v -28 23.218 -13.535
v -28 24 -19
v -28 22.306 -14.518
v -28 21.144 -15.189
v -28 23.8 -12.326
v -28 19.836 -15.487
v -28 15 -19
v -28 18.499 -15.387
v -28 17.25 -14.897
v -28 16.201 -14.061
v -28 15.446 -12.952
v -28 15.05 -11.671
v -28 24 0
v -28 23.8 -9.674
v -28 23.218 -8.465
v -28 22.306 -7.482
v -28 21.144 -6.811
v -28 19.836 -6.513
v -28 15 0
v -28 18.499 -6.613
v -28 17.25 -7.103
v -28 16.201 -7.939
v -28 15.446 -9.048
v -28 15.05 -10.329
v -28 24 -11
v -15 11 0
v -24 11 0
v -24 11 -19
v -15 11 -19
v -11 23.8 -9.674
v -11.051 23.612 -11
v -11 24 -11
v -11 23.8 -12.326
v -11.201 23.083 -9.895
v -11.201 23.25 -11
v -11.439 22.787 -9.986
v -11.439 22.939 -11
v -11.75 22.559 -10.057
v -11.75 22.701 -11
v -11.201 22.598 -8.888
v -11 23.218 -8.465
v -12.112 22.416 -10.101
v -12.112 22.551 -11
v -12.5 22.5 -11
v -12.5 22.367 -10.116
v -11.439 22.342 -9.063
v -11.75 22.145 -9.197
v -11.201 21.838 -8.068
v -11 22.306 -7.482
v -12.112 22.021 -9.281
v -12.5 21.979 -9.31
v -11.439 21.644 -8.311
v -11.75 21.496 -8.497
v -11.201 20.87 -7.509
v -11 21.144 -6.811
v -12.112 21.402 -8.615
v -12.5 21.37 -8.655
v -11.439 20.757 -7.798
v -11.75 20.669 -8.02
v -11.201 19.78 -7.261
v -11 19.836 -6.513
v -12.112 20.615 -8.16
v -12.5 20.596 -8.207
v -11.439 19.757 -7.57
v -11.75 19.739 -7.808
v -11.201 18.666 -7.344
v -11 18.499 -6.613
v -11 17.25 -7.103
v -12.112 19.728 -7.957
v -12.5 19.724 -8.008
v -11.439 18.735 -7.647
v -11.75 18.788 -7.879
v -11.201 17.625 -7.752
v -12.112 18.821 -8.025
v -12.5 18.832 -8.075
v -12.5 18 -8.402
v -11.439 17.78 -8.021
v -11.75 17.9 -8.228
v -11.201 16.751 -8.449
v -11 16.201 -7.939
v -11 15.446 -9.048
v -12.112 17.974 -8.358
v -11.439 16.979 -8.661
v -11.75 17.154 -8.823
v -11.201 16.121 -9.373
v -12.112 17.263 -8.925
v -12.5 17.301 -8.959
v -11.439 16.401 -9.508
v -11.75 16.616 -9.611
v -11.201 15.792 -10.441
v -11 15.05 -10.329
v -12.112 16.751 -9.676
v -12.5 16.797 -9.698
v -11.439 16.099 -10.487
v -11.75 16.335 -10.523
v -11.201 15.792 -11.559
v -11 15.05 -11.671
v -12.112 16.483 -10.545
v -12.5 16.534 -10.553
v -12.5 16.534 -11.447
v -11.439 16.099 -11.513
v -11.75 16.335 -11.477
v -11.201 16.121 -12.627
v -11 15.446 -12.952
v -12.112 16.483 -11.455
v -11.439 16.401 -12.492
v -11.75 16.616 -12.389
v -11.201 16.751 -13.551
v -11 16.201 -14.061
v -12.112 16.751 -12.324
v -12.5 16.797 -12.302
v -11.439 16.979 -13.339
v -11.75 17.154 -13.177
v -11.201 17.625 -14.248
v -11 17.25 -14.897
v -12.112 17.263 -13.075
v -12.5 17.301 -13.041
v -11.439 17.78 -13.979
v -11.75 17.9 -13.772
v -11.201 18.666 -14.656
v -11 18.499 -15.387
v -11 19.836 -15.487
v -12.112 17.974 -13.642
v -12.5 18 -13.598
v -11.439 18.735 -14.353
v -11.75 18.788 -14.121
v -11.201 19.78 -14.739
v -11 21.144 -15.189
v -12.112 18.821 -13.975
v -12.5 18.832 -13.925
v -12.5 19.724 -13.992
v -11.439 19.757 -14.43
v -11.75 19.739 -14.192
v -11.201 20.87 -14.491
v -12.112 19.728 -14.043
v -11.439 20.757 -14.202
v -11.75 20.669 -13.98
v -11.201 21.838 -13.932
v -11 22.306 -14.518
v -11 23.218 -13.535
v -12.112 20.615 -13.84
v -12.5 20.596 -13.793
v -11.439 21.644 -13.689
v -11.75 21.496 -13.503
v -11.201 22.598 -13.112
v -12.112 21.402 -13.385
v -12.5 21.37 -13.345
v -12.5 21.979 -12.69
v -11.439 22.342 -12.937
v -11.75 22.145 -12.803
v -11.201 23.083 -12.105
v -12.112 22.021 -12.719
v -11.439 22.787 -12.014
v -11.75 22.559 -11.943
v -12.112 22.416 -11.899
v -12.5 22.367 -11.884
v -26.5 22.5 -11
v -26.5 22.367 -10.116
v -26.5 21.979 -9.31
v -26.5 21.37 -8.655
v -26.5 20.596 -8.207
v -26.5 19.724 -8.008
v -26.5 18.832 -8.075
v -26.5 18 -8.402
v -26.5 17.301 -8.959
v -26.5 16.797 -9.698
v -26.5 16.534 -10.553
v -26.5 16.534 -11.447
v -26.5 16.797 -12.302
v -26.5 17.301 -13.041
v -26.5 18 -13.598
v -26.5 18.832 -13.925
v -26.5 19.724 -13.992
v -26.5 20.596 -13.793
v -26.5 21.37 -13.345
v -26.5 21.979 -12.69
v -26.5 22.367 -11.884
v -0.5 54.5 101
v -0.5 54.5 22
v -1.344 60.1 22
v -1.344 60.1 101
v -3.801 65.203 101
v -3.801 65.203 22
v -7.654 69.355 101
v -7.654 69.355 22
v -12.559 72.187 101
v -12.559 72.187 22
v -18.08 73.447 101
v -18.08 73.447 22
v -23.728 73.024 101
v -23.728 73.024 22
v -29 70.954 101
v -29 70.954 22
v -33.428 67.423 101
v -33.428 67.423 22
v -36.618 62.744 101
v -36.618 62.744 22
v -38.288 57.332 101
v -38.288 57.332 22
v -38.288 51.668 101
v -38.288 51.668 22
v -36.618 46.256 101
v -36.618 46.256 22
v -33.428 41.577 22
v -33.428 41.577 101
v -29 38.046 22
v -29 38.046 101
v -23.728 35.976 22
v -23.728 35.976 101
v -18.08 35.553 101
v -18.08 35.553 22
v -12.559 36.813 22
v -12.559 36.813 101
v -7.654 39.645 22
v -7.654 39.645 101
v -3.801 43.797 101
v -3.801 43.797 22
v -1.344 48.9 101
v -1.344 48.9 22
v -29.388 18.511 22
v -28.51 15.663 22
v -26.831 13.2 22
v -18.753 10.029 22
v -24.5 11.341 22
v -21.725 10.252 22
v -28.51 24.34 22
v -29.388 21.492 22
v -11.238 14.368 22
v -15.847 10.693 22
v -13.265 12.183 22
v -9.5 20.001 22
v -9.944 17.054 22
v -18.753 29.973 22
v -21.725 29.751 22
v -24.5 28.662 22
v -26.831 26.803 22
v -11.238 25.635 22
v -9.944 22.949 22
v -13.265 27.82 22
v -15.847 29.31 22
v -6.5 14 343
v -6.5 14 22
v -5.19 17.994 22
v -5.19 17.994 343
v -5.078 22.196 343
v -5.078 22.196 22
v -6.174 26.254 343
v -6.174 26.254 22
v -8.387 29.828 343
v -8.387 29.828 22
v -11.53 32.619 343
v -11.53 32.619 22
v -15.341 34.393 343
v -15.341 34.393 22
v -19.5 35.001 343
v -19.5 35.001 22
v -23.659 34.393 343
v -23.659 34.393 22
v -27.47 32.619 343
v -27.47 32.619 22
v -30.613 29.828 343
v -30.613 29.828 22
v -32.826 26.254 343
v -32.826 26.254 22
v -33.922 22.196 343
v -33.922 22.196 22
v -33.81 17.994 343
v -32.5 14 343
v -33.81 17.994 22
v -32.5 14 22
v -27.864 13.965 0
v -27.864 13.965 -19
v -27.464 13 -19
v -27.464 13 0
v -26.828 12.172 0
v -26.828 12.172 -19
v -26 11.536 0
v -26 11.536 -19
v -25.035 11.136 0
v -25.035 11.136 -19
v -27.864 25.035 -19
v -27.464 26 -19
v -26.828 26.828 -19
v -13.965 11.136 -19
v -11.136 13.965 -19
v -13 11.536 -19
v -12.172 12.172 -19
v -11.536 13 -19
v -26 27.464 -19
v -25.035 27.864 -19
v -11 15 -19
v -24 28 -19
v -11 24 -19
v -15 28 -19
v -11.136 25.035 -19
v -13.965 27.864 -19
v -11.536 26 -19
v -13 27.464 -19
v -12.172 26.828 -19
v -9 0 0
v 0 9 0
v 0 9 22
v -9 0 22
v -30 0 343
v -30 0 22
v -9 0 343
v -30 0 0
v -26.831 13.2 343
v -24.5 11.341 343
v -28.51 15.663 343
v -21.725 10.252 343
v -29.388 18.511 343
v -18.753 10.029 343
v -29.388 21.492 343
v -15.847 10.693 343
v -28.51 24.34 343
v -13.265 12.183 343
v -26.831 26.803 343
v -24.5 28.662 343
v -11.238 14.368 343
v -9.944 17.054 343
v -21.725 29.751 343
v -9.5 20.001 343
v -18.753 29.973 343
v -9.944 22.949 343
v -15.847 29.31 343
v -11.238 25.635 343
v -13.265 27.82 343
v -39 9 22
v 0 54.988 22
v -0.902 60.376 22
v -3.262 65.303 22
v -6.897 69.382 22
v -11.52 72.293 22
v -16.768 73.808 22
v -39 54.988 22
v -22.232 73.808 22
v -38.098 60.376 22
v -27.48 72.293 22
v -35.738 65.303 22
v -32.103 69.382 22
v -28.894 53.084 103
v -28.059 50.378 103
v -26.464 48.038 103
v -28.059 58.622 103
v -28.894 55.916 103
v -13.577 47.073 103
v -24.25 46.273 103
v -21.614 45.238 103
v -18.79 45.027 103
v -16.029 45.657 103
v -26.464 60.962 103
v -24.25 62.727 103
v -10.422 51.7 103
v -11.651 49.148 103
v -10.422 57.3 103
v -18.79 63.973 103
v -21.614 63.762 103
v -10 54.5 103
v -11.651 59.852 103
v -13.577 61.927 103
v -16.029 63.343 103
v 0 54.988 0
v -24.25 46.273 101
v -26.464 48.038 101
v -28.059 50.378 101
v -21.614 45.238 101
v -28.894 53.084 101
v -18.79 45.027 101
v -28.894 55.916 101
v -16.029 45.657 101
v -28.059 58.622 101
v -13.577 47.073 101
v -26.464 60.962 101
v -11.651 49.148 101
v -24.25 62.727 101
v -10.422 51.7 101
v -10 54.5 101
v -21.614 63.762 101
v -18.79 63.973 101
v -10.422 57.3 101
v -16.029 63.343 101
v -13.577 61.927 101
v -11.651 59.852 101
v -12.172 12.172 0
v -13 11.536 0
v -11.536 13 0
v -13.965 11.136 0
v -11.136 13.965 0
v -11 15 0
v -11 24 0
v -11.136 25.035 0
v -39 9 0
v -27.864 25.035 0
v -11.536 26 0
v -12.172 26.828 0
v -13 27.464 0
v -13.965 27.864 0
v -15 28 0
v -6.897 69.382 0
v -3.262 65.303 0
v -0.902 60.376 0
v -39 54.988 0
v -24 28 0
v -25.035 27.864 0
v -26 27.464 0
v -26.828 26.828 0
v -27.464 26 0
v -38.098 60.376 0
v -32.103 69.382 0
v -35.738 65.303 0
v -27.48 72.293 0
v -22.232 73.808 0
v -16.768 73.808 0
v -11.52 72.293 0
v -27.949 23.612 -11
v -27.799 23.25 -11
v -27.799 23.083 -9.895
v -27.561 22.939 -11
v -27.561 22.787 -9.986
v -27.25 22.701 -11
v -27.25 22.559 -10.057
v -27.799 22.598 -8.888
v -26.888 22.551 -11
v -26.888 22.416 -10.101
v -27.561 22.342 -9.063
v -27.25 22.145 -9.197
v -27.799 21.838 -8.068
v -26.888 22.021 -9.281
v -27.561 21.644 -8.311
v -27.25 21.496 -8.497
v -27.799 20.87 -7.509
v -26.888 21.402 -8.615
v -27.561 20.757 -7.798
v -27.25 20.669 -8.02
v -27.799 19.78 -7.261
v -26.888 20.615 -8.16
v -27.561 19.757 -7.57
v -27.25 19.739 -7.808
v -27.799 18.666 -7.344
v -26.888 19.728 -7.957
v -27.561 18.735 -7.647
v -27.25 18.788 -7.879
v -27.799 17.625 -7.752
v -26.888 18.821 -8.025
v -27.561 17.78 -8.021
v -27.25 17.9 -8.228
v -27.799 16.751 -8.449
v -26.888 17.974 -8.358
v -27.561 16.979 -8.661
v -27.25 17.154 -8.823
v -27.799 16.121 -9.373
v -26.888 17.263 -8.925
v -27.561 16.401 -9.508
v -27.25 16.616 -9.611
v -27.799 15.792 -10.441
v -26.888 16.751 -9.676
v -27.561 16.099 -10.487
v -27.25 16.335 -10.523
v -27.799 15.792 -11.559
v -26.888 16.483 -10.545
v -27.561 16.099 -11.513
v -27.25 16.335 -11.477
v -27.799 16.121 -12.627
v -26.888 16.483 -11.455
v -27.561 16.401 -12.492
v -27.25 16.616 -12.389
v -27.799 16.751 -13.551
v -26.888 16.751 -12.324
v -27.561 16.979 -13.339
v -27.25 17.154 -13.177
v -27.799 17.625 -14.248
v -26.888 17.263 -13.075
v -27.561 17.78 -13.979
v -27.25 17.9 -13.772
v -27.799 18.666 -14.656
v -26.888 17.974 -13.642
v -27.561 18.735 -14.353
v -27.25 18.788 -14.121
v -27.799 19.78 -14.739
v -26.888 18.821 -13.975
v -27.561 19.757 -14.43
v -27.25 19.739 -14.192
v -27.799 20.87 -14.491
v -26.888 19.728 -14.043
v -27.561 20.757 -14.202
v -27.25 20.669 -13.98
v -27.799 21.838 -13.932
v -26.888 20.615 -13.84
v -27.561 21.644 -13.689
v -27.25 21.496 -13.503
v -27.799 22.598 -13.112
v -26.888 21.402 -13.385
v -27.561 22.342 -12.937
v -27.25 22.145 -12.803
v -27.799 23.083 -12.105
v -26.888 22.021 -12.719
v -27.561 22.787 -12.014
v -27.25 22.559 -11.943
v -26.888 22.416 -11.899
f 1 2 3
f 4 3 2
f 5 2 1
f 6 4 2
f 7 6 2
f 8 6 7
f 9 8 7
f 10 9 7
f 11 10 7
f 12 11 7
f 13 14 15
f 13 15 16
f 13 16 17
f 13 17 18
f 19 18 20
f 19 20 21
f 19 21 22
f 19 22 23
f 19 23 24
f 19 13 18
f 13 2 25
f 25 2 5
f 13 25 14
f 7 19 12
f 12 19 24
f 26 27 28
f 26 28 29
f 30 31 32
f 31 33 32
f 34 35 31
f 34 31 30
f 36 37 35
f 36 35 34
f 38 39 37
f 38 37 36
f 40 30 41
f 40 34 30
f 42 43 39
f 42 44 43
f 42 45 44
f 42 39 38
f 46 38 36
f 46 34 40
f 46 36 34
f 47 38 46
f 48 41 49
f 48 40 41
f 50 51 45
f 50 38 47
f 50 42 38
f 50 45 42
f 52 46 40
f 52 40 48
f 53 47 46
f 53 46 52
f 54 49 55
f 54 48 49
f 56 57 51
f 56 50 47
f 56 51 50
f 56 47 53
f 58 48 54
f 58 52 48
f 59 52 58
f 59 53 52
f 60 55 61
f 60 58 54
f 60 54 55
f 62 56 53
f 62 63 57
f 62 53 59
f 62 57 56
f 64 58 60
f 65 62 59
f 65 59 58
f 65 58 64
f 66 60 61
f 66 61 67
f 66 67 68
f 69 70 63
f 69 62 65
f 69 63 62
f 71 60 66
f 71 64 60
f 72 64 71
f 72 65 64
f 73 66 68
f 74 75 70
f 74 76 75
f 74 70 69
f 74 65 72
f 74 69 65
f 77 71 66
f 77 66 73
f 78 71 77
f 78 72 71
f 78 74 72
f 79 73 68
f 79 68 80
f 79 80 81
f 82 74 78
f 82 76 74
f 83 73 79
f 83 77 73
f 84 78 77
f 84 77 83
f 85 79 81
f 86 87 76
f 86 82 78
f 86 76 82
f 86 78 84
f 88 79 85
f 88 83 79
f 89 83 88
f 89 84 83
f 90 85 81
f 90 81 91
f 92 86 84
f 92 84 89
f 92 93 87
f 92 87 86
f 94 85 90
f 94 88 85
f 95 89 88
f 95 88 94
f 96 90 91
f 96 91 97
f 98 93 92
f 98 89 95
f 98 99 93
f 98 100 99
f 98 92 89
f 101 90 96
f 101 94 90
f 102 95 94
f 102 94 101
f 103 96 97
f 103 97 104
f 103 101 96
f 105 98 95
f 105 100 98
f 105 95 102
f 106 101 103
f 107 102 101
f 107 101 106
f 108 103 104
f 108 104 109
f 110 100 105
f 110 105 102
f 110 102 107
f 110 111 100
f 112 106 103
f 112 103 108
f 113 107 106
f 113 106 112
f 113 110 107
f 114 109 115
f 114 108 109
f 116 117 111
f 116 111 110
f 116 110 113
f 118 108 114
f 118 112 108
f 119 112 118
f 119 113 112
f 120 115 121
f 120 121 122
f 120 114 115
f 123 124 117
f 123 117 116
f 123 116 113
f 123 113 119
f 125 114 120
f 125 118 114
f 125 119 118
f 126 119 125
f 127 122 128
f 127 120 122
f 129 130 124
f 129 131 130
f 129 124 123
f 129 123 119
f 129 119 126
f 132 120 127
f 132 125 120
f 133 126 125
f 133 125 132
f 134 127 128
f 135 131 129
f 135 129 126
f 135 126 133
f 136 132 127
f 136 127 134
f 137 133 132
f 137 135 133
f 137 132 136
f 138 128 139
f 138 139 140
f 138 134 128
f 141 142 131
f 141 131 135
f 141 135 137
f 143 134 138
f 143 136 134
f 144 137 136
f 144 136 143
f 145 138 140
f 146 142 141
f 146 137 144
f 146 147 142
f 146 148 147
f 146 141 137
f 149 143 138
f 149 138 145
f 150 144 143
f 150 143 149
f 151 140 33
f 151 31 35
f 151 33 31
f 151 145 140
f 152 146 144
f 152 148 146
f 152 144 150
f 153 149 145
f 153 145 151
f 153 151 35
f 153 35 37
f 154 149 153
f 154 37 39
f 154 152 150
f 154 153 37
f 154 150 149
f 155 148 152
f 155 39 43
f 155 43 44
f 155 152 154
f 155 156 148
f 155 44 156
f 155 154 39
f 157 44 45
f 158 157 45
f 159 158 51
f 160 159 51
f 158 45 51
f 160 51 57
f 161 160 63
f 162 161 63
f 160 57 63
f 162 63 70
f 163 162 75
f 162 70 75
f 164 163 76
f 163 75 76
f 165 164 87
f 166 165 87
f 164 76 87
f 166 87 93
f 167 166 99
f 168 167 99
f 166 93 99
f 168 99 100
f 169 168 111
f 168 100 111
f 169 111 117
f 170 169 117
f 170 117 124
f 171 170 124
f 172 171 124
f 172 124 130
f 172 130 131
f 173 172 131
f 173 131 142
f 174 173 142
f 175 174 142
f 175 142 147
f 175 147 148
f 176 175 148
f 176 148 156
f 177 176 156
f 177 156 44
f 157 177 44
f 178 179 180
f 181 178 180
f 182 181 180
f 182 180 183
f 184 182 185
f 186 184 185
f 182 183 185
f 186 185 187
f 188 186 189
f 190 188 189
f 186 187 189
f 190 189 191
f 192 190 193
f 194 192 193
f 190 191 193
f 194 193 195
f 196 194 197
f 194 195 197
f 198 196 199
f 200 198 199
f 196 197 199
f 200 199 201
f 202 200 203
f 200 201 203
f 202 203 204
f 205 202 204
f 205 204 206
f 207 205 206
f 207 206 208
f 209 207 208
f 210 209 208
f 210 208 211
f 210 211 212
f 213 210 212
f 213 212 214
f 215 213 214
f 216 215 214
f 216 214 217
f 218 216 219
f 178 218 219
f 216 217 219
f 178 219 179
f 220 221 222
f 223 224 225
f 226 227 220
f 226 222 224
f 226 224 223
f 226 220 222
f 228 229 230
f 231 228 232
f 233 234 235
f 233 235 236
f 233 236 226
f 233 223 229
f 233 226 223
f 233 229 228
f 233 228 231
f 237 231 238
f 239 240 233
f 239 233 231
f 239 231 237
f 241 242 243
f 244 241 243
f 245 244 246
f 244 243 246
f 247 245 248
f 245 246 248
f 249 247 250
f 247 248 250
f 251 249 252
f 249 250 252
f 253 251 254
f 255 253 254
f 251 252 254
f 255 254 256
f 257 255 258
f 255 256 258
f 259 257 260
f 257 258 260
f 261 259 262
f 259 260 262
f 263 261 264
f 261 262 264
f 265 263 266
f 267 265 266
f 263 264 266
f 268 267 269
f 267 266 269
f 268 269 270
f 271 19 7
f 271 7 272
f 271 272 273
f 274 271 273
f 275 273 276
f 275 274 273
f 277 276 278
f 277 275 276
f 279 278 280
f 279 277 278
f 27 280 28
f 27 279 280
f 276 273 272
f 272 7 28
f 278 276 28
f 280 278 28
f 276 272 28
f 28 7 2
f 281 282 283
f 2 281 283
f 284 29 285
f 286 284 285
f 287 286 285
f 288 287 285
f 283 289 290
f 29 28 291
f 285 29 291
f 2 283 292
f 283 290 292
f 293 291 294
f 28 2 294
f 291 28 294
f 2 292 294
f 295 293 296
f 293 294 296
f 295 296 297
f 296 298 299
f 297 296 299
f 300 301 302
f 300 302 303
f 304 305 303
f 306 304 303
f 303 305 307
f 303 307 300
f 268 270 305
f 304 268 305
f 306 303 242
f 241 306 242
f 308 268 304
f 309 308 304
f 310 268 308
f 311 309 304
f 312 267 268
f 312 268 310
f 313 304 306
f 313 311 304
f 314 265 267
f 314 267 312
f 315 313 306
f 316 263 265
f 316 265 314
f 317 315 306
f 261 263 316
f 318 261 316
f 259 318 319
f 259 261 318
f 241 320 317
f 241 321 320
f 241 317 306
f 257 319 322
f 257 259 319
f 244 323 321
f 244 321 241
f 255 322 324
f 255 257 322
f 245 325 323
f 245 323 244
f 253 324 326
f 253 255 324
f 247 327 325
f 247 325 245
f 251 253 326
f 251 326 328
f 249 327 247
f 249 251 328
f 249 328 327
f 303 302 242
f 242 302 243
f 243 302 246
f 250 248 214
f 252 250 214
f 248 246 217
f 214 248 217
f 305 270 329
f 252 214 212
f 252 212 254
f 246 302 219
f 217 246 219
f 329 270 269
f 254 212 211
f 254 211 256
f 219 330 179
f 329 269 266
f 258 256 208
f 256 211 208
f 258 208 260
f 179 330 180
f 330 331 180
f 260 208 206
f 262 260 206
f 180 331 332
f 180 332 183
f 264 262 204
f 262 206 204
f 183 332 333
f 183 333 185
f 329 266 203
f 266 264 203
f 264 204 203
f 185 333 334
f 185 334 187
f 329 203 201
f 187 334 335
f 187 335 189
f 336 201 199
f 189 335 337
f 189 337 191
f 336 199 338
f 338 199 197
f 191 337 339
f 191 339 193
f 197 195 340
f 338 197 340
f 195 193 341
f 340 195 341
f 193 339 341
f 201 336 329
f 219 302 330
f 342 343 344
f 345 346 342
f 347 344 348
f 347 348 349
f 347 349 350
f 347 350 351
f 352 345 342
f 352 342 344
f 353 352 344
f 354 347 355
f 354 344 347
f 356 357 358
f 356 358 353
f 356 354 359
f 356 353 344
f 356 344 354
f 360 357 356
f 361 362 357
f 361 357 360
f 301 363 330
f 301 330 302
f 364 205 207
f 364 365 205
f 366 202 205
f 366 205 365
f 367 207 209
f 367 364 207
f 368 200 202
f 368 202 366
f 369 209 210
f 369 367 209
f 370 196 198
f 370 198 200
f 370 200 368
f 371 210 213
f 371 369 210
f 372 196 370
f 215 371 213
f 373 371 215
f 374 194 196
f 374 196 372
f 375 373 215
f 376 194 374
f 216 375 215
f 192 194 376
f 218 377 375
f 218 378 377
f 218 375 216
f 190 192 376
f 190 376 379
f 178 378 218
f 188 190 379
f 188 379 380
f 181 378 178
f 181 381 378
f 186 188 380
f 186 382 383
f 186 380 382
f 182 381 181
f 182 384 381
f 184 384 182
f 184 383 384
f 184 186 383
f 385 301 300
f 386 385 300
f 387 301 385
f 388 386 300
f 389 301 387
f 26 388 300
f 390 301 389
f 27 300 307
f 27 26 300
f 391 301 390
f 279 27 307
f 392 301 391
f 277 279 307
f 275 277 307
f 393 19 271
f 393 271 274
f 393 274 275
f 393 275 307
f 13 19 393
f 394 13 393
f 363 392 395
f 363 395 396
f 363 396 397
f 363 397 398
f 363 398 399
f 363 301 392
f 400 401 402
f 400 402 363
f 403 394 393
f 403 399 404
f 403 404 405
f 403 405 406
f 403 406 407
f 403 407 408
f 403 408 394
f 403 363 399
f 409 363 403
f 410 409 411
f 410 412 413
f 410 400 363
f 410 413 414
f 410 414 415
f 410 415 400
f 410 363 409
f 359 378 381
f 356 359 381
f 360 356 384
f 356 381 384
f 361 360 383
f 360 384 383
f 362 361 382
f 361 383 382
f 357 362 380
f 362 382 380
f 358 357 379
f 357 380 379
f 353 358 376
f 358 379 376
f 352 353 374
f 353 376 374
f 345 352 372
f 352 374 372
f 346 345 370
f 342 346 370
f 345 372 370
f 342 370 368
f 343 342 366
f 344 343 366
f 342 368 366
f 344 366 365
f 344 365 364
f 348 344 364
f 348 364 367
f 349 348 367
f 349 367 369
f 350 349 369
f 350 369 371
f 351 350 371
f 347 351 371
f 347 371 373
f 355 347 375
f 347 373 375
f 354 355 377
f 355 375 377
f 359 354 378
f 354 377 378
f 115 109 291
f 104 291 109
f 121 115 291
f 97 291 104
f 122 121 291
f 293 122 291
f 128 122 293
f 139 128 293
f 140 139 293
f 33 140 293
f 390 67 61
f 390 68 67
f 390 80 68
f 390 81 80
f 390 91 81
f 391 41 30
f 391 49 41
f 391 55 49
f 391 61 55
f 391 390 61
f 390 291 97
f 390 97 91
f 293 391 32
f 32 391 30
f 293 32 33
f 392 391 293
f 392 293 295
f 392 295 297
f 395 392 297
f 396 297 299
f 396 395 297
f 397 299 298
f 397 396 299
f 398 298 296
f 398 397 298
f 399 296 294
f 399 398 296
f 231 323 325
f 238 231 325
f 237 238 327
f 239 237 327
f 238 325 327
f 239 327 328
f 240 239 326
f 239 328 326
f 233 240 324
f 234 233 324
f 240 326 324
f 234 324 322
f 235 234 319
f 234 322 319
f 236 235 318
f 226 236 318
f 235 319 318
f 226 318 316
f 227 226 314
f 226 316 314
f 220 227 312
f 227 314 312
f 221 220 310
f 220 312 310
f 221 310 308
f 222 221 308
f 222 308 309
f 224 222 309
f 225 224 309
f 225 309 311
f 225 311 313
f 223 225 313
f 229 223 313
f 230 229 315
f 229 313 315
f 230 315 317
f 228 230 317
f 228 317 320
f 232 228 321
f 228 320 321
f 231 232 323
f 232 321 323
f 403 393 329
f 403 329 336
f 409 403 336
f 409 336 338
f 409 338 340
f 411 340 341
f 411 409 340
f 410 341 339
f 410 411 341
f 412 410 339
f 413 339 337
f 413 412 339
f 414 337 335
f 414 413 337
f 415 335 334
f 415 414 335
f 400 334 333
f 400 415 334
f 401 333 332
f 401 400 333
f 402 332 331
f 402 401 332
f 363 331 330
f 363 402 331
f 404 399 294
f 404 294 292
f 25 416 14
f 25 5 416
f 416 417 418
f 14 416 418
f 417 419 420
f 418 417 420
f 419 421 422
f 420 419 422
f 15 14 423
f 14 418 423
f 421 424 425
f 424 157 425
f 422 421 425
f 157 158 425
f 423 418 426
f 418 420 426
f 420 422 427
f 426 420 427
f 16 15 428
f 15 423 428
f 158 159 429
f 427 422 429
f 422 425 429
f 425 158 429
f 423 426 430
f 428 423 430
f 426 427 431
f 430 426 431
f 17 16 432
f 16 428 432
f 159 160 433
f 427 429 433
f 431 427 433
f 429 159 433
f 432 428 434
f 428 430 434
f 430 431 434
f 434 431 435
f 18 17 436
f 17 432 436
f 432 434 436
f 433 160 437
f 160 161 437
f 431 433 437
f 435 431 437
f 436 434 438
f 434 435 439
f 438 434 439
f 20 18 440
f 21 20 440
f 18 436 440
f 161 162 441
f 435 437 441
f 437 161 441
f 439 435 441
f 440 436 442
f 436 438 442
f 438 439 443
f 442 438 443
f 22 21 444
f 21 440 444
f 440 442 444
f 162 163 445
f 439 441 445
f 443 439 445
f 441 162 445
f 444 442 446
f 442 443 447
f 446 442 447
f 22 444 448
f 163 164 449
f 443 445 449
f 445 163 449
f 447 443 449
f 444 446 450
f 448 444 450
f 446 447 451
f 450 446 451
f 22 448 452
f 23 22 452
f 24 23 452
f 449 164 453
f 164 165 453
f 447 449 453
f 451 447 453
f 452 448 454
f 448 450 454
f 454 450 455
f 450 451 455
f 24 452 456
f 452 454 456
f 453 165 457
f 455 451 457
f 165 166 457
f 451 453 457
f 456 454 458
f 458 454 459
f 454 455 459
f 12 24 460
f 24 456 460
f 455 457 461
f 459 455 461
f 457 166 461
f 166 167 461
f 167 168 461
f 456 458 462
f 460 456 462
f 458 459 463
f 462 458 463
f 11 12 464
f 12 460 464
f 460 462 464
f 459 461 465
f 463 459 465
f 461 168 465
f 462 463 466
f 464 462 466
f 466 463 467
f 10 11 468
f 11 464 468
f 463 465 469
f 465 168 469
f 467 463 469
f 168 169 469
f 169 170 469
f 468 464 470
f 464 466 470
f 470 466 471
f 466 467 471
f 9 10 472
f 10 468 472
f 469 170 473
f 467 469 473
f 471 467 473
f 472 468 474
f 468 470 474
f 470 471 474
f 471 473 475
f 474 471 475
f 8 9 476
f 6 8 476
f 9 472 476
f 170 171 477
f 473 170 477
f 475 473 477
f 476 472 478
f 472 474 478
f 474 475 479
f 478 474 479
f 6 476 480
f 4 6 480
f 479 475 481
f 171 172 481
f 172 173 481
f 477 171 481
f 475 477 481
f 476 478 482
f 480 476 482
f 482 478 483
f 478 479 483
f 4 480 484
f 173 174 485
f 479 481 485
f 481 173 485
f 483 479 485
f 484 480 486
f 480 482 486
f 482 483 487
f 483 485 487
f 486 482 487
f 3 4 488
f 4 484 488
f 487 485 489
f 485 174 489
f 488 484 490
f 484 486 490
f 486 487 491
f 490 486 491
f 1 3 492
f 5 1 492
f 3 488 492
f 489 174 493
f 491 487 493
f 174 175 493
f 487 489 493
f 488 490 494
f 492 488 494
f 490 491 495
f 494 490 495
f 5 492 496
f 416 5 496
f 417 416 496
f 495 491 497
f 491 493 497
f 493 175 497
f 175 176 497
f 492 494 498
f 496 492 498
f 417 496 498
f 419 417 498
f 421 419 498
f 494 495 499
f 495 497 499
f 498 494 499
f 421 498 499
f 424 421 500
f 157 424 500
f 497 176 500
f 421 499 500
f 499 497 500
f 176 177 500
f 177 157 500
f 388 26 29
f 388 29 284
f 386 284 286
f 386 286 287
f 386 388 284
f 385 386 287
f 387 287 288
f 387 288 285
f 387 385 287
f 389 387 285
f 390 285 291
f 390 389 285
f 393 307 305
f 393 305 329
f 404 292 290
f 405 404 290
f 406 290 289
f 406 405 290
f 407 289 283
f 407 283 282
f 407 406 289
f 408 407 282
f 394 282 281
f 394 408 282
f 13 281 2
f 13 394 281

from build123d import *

# Parameters (mm, degrees)
SALIENTE_EXTRUIR1_DEPTH = 22
CROQUIS2_R              = 19
SALIENTE_EXTRUIR2_DEPTH = 79
CROQUIS3_R              = 9.5
SALIENTE_EXTRUIR3_DEPTH = 2
SALIENTE_EXTRUIR4_DEPTH = 321
CROQUIS5_R              = 10
CORTAR_EXTRUIR1_DEPTH   = 321
SALIENTE_EXTRUIR5_DEPTH = 19
CORTAR_EXTRUIR2_REACH   = 354.007
CROQUIS8_R              = 3
REDONDEO1_R             = 1.5


with BuildPart() as part:
    # Croquis1 → Saliente-Extruir1 (new body)
    with BuildSketch(Plane.XY):
        with BuildLine():
            Line((-9, 0), (-30, 0))
            Line((-30, 0), (-39, 9))
            Line((-39, 9), (-39, 54.9875))
            ThreePointArc((-39, 54.9875), (-19.5, 74), (0, 54.9875))
            Line((0, 54.9875), (0, 9))
            Line((0, 9), (-9, 0))
        make_face()
    extrude(amount=SALIENTE_EXTRUIR1_DEPTH)

    # Croquis2 → Saliente-Extruir2 (add)
    with BuildSketch(Plane.XY.offset(22)):
        with Locations((-19.5, 54.5)):
            Circle(CROQUIS2_R)
    extrude(amount=SALIENTE_EXTRUIR2_DEPTH)

    # Croquis3 → Saliente-Extruir3 (add)
    with BuildSketch(Plane.XY.offset(101)):
        with Locations((-19.5, 54.5)):
            Circle(CROQUIS3_R)
    extrude(amount=SALIENTE_EXTRUIR3_DEPTH)

    # Croquis4 → Saliente-Extruir4 (add)
    with BuildSketch(Plane.XY.offset(22)):
        with BuildLine():
            Line((-32.5, 14), (-30, 0))
            Line((-30, 0), (-9, 0))
            Line((-9, 0), (-6.5, 14))
            ThreePointArc((-6.5, 14), (-19.5, 35.001407257), (-32.5, 14))
        make_face()
    extrude(amount=SALIENTE_EXTRUIR4_DEPTH)

    # Croquis5 → Cortar-Extruir1 (cut)
    with BuildSketch(Plane.XY.offset(343)):
        with Locations((-19.5, 20.001407257)):
            Circle(CROQUIS5_R)
    extrude(amount=-CORTAR_EXTRUIR1_DEPTH, mode=Mode.SUBTRACT)

    # Croquis6 → Saliente-Extruir5 (add)
    with BuildSketch(Plane(origin=(0, 0, 0), x_dir=(-1, 0, 0), z_dir=(0, 0, -1))):
        with BuildLine():
            Line((24, 11), (19.5, 11))
            Line((19.5, 11), (15, 11))
            ThreePointArc((15, 11), (12.171572875, 12.171572875), (11, 15))
            Line((11, 15), (11, 24))
            ThreePointArc((11, 24), (12.171572875, 26.828427125), (15, 28))
            Line((15, 28), (24, 28))
            ThreePointArc((24, 28), (26.828427125, 26.828427125), (28, 24))
            Line((28, 24), (28, 15))
            ThreePointArc((28, 15), (26.828427125, 12.171572875), (24, 11))
        make_face()
    extrude(amount=SALIENTE_EXTRUIR5_DEPTH)

    # Croquis8 → Cortar-Extruir2 (cut, up to next)
    with BuildSketch(Plane(origin=(-11, 0, 0), x_dir=(0, 0, -1), z_dir=(1, 0, 0)), mode=Mode.PRIVATE) as cortar_extruir2_sk1:
        with Locations(Location((11, 19.5, 0), (0, 0, 90))):
            Circle(CROQUIS8_R)
    cortar_extruir2_tool1 = extrude(cortar_extruir2_sk1.sketch, amount=-CORTAR_EXTRUIR2_REACH, mode=Mode.PRIVATE) & part.part
    add(cortar_extruir2_tool1.solids().sort_by_distance((-11, 19.5, -11))[0], mode=Mode.SUBTRACT)

    # Redondeo1
    redondeo1_edges = [part.edges().sort_by_distance(p)[0] for p in [
        (-11, 16.5, -11),
        (-28, 16.5, -11),
    ]]
    fillet(redondeo1_edges, radius=REDONDEO1_R - 0.0001)  # a hair under: the kernel refuses the full size


solid = part.part
